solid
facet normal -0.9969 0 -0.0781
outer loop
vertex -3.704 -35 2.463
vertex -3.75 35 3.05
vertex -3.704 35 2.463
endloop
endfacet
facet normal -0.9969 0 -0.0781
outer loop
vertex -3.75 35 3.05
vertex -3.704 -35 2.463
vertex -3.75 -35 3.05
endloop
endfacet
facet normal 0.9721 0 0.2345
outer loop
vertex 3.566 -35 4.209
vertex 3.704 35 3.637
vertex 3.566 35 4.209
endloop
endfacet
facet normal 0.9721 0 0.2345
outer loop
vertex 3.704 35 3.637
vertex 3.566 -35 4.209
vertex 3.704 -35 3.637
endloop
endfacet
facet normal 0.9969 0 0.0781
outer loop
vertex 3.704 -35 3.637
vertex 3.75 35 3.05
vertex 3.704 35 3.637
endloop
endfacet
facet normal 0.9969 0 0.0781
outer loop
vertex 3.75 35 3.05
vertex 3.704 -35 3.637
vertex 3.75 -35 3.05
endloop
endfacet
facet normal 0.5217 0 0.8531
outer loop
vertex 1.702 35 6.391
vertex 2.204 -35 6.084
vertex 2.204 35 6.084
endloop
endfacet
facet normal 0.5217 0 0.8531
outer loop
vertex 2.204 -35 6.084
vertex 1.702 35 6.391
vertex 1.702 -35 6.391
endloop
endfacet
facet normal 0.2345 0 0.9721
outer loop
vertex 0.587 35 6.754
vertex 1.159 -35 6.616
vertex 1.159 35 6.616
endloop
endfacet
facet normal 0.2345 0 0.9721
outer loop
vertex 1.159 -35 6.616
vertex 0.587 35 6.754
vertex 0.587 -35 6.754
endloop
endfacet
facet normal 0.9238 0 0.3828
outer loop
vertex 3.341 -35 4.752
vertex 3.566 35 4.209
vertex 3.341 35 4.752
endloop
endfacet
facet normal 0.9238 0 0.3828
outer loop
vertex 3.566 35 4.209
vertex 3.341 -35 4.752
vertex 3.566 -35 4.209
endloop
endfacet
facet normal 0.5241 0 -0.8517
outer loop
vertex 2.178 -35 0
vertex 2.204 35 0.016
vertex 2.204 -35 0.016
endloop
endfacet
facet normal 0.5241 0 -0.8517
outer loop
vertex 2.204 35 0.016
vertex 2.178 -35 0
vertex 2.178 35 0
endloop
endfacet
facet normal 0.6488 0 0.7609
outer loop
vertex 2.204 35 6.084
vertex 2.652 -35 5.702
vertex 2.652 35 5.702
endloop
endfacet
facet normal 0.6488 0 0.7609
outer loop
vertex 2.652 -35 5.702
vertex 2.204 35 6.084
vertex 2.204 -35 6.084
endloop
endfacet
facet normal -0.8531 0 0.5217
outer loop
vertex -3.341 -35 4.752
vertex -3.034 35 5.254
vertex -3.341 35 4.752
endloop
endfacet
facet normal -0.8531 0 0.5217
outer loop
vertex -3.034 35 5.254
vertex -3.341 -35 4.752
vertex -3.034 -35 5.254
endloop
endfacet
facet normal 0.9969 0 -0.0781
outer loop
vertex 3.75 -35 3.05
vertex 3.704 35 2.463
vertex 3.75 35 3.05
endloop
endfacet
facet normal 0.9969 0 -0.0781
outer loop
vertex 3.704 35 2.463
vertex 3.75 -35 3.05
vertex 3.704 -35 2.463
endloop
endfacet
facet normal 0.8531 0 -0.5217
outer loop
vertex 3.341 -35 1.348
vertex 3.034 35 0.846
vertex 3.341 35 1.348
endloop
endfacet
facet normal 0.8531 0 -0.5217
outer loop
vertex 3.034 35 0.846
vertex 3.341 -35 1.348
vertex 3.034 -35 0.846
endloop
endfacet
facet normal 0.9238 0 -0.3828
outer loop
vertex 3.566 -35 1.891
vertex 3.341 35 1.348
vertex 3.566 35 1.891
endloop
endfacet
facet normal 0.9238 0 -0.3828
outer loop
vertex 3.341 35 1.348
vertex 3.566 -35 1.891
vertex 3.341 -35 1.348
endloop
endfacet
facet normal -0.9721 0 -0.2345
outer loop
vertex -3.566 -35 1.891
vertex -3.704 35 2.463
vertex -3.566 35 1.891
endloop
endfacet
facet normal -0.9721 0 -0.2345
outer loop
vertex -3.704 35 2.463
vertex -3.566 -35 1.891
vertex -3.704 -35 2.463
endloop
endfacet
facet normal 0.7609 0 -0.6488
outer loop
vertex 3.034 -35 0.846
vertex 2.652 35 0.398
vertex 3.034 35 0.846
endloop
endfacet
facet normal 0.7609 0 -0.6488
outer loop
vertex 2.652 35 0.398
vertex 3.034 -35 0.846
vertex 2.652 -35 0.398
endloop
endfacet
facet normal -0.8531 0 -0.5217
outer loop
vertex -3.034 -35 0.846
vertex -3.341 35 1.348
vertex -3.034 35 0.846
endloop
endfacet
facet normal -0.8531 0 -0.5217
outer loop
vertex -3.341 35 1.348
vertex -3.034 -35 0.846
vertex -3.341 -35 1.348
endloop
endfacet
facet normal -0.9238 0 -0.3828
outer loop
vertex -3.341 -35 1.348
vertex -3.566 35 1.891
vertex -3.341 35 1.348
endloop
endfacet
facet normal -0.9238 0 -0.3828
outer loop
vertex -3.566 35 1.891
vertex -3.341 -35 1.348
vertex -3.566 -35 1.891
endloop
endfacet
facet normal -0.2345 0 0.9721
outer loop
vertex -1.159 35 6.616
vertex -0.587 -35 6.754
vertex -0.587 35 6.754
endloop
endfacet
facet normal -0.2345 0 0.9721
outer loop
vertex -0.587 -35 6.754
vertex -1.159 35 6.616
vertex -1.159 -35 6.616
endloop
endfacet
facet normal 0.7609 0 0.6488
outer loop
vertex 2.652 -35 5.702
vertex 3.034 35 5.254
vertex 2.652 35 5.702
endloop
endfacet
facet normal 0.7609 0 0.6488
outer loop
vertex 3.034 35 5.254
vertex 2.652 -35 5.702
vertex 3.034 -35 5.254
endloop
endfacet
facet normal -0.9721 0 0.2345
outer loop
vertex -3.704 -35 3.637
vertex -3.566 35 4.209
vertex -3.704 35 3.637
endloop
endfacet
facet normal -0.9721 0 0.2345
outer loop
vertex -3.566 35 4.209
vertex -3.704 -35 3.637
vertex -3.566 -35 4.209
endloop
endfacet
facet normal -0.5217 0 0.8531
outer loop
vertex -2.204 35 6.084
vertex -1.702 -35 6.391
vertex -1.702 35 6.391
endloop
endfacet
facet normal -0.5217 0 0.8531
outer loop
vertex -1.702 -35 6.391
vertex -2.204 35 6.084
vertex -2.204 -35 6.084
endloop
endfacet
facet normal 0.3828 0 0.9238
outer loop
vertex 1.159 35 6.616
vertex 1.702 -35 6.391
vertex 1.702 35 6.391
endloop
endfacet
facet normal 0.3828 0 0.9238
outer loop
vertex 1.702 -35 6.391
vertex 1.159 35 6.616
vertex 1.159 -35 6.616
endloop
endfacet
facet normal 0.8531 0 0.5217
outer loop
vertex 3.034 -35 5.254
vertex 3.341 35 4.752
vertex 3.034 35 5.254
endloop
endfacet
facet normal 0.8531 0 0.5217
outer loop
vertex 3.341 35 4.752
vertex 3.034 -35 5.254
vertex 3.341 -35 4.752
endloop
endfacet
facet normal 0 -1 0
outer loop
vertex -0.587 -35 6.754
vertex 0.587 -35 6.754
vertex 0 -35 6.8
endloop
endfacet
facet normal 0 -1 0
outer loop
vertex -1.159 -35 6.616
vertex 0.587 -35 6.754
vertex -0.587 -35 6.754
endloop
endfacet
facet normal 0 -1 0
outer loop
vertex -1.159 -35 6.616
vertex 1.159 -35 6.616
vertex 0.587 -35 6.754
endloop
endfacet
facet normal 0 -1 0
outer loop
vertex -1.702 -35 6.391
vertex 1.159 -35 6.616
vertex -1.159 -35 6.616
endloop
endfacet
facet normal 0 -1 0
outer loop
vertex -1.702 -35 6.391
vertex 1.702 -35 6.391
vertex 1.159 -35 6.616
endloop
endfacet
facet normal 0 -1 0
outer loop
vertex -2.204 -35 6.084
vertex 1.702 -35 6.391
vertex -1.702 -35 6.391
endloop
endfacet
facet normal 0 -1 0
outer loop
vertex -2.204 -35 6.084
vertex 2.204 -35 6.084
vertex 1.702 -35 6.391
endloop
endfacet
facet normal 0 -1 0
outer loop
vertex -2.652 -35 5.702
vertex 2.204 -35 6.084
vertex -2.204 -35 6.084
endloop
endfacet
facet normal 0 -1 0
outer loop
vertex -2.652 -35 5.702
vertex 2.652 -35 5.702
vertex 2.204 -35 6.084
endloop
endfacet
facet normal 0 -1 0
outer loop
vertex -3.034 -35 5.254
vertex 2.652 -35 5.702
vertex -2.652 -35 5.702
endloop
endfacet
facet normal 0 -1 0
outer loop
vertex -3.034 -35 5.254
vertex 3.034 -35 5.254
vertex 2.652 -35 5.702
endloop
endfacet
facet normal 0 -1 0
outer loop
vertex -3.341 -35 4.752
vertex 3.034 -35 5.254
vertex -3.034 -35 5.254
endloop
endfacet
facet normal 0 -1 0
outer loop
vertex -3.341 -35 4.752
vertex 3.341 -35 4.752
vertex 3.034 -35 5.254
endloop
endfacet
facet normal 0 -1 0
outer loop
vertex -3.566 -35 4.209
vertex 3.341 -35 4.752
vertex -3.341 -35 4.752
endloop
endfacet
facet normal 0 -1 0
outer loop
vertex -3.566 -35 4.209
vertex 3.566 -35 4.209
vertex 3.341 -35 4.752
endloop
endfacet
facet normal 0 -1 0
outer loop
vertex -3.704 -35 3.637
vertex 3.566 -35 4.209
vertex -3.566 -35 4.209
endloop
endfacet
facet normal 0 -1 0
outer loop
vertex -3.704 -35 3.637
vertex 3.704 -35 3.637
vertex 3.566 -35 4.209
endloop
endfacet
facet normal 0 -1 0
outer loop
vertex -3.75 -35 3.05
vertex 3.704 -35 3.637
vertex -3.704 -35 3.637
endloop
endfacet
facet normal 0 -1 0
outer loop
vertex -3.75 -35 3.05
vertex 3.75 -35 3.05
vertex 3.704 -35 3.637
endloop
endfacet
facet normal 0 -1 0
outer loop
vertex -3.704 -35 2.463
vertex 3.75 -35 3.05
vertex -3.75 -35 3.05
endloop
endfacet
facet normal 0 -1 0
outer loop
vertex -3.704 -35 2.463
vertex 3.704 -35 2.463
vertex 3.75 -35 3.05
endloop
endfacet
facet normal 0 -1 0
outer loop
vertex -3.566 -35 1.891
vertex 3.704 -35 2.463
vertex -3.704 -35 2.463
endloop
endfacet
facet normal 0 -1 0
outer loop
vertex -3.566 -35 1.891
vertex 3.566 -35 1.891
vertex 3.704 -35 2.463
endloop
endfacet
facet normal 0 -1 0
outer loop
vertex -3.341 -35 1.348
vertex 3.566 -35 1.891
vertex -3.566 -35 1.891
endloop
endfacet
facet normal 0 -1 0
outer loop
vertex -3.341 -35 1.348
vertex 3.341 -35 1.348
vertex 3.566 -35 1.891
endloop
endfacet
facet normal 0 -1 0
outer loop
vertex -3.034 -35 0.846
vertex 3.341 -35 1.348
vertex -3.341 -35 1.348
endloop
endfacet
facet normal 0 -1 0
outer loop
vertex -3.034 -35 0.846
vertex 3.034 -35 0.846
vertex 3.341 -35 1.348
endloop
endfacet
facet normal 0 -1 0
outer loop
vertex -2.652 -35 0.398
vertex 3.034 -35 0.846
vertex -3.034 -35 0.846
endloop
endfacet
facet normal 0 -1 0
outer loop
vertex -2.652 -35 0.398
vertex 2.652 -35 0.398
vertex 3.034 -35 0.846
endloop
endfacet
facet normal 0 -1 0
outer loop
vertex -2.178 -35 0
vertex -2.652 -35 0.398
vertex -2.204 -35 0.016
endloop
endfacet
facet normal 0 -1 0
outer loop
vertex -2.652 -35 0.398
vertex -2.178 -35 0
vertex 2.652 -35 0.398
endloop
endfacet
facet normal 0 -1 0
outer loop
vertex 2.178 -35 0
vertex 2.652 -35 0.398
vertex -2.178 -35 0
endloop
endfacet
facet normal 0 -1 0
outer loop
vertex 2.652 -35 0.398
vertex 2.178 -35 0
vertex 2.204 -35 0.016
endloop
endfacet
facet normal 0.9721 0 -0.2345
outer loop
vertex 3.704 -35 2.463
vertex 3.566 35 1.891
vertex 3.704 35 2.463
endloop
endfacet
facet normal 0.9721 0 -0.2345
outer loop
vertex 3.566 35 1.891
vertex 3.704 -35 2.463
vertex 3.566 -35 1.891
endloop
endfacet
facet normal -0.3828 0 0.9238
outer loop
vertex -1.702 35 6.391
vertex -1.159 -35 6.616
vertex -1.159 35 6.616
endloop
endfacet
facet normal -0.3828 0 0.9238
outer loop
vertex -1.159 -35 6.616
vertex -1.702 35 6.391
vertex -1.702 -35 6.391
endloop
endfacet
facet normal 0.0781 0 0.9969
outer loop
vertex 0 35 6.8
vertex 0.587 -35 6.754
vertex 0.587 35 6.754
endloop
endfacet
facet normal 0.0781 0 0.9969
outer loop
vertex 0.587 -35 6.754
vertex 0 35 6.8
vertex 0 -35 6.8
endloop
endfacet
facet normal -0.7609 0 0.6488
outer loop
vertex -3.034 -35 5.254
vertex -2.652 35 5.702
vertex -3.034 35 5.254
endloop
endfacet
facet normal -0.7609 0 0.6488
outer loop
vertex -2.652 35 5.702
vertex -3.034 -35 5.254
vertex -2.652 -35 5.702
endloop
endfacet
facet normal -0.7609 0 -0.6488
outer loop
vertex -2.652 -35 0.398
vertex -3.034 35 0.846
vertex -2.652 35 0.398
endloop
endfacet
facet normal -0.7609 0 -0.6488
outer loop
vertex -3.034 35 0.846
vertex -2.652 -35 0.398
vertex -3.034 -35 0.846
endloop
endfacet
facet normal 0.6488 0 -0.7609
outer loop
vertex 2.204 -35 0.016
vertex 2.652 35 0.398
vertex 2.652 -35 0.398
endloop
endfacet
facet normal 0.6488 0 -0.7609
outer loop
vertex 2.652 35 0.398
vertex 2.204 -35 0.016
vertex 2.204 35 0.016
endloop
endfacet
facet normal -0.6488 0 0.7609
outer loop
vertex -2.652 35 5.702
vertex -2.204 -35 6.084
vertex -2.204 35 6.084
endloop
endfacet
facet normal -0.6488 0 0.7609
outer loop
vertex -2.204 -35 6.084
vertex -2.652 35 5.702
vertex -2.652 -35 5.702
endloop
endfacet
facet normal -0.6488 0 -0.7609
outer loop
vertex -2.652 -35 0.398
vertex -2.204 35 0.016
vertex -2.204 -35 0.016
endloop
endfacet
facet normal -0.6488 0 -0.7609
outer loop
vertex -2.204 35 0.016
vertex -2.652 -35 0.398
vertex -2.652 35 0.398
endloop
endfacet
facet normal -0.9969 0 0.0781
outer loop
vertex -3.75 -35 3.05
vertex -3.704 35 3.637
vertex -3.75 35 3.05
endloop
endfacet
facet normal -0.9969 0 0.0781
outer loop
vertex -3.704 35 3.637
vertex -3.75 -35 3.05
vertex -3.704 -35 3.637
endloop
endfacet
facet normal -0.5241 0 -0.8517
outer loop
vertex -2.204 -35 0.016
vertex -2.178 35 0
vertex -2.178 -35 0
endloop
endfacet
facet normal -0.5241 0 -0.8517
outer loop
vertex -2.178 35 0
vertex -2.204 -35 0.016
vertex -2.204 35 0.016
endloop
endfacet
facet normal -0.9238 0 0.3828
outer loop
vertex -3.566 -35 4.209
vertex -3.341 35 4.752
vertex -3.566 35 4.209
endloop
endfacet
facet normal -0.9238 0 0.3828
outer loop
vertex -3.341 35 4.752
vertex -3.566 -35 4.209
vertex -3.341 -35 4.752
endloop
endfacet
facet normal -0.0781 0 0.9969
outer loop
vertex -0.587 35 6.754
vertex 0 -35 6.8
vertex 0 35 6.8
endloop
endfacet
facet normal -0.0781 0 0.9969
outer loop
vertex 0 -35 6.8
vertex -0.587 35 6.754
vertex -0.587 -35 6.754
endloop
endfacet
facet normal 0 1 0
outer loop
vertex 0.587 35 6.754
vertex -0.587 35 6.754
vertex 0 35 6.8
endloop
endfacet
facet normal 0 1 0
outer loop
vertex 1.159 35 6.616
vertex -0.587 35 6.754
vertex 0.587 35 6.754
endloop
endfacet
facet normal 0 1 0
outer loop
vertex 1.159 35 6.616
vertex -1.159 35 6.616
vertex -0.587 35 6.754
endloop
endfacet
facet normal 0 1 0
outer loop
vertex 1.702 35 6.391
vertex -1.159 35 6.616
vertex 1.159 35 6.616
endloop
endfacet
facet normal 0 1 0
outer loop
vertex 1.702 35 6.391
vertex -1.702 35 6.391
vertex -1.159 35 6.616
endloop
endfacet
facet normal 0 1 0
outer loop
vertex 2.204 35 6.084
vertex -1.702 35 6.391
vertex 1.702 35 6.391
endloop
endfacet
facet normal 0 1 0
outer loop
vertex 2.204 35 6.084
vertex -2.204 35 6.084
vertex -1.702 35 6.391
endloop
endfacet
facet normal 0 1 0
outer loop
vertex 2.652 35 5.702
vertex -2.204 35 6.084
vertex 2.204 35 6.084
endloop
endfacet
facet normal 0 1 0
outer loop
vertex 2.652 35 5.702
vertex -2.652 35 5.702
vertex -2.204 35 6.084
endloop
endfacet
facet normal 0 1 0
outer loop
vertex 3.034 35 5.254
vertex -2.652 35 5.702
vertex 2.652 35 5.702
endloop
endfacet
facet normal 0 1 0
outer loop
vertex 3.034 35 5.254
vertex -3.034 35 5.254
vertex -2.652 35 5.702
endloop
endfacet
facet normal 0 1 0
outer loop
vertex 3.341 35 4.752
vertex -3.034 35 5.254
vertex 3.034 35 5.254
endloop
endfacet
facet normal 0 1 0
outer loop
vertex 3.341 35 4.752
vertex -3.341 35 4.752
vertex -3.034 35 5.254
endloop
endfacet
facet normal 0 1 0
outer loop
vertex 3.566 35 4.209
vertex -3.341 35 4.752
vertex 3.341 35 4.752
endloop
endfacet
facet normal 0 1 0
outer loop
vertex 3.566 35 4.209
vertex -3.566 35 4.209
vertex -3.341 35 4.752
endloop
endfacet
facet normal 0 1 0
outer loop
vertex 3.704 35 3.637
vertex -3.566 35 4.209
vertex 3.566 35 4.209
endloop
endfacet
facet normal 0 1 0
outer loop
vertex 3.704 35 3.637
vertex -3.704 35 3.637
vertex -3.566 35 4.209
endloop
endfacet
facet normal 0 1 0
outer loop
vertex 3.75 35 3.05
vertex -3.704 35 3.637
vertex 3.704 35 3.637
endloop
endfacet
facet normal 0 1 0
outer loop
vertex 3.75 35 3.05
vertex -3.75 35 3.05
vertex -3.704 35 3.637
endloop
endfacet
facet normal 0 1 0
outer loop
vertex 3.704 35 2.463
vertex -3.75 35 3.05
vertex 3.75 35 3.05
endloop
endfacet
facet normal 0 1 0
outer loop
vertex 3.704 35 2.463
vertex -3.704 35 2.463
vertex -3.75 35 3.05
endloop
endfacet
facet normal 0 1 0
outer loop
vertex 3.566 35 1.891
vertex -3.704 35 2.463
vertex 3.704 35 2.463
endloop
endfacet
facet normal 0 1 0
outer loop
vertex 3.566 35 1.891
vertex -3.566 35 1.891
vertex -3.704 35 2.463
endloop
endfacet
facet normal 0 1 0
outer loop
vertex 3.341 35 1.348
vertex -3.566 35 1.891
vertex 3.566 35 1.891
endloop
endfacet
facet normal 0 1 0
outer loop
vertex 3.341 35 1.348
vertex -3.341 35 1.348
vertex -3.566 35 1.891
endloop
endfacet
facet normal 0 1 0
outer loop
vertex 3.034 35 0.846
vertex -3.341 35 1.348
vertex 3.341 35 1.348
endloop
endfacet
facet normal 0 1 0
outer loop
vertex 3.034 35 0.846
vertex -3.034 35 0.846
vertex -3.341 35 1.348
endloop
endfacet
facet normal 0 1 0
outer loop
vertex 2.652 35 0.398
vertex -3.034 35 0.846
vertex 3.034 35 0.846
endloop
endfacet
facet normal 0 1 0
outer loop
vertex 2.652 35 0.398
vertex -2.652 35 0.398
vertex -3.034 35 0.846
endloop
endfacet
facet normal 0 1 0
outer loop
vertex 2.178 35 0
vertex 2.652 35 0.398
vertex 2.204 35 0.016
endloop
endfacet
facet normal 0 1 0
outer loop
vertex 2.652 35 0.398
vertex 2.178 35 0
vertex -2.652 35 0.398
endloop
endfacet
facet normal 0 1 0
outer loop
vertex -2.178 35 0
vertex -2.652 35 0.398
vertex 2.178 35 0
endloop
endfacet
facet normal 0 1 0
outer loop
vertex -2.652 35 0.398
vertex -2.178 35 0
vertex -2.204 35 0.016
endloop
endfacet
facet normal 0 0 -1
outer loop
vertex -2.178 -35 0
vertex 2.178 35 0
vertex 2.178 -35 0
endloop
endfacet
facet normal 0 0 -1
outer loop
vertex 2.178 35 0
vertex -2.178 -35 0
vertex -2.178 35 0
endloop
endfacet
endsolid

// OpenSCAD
//cube([5, 10, 0.3]);

intersection() {
    translate([0, 0, 7.5/2 - 0.7])
    rotate([90, 0, 0])
    cylinder(d=7.5, h=70, center=true, $fn=40);

    cylinder(d=100, h=20);
}
